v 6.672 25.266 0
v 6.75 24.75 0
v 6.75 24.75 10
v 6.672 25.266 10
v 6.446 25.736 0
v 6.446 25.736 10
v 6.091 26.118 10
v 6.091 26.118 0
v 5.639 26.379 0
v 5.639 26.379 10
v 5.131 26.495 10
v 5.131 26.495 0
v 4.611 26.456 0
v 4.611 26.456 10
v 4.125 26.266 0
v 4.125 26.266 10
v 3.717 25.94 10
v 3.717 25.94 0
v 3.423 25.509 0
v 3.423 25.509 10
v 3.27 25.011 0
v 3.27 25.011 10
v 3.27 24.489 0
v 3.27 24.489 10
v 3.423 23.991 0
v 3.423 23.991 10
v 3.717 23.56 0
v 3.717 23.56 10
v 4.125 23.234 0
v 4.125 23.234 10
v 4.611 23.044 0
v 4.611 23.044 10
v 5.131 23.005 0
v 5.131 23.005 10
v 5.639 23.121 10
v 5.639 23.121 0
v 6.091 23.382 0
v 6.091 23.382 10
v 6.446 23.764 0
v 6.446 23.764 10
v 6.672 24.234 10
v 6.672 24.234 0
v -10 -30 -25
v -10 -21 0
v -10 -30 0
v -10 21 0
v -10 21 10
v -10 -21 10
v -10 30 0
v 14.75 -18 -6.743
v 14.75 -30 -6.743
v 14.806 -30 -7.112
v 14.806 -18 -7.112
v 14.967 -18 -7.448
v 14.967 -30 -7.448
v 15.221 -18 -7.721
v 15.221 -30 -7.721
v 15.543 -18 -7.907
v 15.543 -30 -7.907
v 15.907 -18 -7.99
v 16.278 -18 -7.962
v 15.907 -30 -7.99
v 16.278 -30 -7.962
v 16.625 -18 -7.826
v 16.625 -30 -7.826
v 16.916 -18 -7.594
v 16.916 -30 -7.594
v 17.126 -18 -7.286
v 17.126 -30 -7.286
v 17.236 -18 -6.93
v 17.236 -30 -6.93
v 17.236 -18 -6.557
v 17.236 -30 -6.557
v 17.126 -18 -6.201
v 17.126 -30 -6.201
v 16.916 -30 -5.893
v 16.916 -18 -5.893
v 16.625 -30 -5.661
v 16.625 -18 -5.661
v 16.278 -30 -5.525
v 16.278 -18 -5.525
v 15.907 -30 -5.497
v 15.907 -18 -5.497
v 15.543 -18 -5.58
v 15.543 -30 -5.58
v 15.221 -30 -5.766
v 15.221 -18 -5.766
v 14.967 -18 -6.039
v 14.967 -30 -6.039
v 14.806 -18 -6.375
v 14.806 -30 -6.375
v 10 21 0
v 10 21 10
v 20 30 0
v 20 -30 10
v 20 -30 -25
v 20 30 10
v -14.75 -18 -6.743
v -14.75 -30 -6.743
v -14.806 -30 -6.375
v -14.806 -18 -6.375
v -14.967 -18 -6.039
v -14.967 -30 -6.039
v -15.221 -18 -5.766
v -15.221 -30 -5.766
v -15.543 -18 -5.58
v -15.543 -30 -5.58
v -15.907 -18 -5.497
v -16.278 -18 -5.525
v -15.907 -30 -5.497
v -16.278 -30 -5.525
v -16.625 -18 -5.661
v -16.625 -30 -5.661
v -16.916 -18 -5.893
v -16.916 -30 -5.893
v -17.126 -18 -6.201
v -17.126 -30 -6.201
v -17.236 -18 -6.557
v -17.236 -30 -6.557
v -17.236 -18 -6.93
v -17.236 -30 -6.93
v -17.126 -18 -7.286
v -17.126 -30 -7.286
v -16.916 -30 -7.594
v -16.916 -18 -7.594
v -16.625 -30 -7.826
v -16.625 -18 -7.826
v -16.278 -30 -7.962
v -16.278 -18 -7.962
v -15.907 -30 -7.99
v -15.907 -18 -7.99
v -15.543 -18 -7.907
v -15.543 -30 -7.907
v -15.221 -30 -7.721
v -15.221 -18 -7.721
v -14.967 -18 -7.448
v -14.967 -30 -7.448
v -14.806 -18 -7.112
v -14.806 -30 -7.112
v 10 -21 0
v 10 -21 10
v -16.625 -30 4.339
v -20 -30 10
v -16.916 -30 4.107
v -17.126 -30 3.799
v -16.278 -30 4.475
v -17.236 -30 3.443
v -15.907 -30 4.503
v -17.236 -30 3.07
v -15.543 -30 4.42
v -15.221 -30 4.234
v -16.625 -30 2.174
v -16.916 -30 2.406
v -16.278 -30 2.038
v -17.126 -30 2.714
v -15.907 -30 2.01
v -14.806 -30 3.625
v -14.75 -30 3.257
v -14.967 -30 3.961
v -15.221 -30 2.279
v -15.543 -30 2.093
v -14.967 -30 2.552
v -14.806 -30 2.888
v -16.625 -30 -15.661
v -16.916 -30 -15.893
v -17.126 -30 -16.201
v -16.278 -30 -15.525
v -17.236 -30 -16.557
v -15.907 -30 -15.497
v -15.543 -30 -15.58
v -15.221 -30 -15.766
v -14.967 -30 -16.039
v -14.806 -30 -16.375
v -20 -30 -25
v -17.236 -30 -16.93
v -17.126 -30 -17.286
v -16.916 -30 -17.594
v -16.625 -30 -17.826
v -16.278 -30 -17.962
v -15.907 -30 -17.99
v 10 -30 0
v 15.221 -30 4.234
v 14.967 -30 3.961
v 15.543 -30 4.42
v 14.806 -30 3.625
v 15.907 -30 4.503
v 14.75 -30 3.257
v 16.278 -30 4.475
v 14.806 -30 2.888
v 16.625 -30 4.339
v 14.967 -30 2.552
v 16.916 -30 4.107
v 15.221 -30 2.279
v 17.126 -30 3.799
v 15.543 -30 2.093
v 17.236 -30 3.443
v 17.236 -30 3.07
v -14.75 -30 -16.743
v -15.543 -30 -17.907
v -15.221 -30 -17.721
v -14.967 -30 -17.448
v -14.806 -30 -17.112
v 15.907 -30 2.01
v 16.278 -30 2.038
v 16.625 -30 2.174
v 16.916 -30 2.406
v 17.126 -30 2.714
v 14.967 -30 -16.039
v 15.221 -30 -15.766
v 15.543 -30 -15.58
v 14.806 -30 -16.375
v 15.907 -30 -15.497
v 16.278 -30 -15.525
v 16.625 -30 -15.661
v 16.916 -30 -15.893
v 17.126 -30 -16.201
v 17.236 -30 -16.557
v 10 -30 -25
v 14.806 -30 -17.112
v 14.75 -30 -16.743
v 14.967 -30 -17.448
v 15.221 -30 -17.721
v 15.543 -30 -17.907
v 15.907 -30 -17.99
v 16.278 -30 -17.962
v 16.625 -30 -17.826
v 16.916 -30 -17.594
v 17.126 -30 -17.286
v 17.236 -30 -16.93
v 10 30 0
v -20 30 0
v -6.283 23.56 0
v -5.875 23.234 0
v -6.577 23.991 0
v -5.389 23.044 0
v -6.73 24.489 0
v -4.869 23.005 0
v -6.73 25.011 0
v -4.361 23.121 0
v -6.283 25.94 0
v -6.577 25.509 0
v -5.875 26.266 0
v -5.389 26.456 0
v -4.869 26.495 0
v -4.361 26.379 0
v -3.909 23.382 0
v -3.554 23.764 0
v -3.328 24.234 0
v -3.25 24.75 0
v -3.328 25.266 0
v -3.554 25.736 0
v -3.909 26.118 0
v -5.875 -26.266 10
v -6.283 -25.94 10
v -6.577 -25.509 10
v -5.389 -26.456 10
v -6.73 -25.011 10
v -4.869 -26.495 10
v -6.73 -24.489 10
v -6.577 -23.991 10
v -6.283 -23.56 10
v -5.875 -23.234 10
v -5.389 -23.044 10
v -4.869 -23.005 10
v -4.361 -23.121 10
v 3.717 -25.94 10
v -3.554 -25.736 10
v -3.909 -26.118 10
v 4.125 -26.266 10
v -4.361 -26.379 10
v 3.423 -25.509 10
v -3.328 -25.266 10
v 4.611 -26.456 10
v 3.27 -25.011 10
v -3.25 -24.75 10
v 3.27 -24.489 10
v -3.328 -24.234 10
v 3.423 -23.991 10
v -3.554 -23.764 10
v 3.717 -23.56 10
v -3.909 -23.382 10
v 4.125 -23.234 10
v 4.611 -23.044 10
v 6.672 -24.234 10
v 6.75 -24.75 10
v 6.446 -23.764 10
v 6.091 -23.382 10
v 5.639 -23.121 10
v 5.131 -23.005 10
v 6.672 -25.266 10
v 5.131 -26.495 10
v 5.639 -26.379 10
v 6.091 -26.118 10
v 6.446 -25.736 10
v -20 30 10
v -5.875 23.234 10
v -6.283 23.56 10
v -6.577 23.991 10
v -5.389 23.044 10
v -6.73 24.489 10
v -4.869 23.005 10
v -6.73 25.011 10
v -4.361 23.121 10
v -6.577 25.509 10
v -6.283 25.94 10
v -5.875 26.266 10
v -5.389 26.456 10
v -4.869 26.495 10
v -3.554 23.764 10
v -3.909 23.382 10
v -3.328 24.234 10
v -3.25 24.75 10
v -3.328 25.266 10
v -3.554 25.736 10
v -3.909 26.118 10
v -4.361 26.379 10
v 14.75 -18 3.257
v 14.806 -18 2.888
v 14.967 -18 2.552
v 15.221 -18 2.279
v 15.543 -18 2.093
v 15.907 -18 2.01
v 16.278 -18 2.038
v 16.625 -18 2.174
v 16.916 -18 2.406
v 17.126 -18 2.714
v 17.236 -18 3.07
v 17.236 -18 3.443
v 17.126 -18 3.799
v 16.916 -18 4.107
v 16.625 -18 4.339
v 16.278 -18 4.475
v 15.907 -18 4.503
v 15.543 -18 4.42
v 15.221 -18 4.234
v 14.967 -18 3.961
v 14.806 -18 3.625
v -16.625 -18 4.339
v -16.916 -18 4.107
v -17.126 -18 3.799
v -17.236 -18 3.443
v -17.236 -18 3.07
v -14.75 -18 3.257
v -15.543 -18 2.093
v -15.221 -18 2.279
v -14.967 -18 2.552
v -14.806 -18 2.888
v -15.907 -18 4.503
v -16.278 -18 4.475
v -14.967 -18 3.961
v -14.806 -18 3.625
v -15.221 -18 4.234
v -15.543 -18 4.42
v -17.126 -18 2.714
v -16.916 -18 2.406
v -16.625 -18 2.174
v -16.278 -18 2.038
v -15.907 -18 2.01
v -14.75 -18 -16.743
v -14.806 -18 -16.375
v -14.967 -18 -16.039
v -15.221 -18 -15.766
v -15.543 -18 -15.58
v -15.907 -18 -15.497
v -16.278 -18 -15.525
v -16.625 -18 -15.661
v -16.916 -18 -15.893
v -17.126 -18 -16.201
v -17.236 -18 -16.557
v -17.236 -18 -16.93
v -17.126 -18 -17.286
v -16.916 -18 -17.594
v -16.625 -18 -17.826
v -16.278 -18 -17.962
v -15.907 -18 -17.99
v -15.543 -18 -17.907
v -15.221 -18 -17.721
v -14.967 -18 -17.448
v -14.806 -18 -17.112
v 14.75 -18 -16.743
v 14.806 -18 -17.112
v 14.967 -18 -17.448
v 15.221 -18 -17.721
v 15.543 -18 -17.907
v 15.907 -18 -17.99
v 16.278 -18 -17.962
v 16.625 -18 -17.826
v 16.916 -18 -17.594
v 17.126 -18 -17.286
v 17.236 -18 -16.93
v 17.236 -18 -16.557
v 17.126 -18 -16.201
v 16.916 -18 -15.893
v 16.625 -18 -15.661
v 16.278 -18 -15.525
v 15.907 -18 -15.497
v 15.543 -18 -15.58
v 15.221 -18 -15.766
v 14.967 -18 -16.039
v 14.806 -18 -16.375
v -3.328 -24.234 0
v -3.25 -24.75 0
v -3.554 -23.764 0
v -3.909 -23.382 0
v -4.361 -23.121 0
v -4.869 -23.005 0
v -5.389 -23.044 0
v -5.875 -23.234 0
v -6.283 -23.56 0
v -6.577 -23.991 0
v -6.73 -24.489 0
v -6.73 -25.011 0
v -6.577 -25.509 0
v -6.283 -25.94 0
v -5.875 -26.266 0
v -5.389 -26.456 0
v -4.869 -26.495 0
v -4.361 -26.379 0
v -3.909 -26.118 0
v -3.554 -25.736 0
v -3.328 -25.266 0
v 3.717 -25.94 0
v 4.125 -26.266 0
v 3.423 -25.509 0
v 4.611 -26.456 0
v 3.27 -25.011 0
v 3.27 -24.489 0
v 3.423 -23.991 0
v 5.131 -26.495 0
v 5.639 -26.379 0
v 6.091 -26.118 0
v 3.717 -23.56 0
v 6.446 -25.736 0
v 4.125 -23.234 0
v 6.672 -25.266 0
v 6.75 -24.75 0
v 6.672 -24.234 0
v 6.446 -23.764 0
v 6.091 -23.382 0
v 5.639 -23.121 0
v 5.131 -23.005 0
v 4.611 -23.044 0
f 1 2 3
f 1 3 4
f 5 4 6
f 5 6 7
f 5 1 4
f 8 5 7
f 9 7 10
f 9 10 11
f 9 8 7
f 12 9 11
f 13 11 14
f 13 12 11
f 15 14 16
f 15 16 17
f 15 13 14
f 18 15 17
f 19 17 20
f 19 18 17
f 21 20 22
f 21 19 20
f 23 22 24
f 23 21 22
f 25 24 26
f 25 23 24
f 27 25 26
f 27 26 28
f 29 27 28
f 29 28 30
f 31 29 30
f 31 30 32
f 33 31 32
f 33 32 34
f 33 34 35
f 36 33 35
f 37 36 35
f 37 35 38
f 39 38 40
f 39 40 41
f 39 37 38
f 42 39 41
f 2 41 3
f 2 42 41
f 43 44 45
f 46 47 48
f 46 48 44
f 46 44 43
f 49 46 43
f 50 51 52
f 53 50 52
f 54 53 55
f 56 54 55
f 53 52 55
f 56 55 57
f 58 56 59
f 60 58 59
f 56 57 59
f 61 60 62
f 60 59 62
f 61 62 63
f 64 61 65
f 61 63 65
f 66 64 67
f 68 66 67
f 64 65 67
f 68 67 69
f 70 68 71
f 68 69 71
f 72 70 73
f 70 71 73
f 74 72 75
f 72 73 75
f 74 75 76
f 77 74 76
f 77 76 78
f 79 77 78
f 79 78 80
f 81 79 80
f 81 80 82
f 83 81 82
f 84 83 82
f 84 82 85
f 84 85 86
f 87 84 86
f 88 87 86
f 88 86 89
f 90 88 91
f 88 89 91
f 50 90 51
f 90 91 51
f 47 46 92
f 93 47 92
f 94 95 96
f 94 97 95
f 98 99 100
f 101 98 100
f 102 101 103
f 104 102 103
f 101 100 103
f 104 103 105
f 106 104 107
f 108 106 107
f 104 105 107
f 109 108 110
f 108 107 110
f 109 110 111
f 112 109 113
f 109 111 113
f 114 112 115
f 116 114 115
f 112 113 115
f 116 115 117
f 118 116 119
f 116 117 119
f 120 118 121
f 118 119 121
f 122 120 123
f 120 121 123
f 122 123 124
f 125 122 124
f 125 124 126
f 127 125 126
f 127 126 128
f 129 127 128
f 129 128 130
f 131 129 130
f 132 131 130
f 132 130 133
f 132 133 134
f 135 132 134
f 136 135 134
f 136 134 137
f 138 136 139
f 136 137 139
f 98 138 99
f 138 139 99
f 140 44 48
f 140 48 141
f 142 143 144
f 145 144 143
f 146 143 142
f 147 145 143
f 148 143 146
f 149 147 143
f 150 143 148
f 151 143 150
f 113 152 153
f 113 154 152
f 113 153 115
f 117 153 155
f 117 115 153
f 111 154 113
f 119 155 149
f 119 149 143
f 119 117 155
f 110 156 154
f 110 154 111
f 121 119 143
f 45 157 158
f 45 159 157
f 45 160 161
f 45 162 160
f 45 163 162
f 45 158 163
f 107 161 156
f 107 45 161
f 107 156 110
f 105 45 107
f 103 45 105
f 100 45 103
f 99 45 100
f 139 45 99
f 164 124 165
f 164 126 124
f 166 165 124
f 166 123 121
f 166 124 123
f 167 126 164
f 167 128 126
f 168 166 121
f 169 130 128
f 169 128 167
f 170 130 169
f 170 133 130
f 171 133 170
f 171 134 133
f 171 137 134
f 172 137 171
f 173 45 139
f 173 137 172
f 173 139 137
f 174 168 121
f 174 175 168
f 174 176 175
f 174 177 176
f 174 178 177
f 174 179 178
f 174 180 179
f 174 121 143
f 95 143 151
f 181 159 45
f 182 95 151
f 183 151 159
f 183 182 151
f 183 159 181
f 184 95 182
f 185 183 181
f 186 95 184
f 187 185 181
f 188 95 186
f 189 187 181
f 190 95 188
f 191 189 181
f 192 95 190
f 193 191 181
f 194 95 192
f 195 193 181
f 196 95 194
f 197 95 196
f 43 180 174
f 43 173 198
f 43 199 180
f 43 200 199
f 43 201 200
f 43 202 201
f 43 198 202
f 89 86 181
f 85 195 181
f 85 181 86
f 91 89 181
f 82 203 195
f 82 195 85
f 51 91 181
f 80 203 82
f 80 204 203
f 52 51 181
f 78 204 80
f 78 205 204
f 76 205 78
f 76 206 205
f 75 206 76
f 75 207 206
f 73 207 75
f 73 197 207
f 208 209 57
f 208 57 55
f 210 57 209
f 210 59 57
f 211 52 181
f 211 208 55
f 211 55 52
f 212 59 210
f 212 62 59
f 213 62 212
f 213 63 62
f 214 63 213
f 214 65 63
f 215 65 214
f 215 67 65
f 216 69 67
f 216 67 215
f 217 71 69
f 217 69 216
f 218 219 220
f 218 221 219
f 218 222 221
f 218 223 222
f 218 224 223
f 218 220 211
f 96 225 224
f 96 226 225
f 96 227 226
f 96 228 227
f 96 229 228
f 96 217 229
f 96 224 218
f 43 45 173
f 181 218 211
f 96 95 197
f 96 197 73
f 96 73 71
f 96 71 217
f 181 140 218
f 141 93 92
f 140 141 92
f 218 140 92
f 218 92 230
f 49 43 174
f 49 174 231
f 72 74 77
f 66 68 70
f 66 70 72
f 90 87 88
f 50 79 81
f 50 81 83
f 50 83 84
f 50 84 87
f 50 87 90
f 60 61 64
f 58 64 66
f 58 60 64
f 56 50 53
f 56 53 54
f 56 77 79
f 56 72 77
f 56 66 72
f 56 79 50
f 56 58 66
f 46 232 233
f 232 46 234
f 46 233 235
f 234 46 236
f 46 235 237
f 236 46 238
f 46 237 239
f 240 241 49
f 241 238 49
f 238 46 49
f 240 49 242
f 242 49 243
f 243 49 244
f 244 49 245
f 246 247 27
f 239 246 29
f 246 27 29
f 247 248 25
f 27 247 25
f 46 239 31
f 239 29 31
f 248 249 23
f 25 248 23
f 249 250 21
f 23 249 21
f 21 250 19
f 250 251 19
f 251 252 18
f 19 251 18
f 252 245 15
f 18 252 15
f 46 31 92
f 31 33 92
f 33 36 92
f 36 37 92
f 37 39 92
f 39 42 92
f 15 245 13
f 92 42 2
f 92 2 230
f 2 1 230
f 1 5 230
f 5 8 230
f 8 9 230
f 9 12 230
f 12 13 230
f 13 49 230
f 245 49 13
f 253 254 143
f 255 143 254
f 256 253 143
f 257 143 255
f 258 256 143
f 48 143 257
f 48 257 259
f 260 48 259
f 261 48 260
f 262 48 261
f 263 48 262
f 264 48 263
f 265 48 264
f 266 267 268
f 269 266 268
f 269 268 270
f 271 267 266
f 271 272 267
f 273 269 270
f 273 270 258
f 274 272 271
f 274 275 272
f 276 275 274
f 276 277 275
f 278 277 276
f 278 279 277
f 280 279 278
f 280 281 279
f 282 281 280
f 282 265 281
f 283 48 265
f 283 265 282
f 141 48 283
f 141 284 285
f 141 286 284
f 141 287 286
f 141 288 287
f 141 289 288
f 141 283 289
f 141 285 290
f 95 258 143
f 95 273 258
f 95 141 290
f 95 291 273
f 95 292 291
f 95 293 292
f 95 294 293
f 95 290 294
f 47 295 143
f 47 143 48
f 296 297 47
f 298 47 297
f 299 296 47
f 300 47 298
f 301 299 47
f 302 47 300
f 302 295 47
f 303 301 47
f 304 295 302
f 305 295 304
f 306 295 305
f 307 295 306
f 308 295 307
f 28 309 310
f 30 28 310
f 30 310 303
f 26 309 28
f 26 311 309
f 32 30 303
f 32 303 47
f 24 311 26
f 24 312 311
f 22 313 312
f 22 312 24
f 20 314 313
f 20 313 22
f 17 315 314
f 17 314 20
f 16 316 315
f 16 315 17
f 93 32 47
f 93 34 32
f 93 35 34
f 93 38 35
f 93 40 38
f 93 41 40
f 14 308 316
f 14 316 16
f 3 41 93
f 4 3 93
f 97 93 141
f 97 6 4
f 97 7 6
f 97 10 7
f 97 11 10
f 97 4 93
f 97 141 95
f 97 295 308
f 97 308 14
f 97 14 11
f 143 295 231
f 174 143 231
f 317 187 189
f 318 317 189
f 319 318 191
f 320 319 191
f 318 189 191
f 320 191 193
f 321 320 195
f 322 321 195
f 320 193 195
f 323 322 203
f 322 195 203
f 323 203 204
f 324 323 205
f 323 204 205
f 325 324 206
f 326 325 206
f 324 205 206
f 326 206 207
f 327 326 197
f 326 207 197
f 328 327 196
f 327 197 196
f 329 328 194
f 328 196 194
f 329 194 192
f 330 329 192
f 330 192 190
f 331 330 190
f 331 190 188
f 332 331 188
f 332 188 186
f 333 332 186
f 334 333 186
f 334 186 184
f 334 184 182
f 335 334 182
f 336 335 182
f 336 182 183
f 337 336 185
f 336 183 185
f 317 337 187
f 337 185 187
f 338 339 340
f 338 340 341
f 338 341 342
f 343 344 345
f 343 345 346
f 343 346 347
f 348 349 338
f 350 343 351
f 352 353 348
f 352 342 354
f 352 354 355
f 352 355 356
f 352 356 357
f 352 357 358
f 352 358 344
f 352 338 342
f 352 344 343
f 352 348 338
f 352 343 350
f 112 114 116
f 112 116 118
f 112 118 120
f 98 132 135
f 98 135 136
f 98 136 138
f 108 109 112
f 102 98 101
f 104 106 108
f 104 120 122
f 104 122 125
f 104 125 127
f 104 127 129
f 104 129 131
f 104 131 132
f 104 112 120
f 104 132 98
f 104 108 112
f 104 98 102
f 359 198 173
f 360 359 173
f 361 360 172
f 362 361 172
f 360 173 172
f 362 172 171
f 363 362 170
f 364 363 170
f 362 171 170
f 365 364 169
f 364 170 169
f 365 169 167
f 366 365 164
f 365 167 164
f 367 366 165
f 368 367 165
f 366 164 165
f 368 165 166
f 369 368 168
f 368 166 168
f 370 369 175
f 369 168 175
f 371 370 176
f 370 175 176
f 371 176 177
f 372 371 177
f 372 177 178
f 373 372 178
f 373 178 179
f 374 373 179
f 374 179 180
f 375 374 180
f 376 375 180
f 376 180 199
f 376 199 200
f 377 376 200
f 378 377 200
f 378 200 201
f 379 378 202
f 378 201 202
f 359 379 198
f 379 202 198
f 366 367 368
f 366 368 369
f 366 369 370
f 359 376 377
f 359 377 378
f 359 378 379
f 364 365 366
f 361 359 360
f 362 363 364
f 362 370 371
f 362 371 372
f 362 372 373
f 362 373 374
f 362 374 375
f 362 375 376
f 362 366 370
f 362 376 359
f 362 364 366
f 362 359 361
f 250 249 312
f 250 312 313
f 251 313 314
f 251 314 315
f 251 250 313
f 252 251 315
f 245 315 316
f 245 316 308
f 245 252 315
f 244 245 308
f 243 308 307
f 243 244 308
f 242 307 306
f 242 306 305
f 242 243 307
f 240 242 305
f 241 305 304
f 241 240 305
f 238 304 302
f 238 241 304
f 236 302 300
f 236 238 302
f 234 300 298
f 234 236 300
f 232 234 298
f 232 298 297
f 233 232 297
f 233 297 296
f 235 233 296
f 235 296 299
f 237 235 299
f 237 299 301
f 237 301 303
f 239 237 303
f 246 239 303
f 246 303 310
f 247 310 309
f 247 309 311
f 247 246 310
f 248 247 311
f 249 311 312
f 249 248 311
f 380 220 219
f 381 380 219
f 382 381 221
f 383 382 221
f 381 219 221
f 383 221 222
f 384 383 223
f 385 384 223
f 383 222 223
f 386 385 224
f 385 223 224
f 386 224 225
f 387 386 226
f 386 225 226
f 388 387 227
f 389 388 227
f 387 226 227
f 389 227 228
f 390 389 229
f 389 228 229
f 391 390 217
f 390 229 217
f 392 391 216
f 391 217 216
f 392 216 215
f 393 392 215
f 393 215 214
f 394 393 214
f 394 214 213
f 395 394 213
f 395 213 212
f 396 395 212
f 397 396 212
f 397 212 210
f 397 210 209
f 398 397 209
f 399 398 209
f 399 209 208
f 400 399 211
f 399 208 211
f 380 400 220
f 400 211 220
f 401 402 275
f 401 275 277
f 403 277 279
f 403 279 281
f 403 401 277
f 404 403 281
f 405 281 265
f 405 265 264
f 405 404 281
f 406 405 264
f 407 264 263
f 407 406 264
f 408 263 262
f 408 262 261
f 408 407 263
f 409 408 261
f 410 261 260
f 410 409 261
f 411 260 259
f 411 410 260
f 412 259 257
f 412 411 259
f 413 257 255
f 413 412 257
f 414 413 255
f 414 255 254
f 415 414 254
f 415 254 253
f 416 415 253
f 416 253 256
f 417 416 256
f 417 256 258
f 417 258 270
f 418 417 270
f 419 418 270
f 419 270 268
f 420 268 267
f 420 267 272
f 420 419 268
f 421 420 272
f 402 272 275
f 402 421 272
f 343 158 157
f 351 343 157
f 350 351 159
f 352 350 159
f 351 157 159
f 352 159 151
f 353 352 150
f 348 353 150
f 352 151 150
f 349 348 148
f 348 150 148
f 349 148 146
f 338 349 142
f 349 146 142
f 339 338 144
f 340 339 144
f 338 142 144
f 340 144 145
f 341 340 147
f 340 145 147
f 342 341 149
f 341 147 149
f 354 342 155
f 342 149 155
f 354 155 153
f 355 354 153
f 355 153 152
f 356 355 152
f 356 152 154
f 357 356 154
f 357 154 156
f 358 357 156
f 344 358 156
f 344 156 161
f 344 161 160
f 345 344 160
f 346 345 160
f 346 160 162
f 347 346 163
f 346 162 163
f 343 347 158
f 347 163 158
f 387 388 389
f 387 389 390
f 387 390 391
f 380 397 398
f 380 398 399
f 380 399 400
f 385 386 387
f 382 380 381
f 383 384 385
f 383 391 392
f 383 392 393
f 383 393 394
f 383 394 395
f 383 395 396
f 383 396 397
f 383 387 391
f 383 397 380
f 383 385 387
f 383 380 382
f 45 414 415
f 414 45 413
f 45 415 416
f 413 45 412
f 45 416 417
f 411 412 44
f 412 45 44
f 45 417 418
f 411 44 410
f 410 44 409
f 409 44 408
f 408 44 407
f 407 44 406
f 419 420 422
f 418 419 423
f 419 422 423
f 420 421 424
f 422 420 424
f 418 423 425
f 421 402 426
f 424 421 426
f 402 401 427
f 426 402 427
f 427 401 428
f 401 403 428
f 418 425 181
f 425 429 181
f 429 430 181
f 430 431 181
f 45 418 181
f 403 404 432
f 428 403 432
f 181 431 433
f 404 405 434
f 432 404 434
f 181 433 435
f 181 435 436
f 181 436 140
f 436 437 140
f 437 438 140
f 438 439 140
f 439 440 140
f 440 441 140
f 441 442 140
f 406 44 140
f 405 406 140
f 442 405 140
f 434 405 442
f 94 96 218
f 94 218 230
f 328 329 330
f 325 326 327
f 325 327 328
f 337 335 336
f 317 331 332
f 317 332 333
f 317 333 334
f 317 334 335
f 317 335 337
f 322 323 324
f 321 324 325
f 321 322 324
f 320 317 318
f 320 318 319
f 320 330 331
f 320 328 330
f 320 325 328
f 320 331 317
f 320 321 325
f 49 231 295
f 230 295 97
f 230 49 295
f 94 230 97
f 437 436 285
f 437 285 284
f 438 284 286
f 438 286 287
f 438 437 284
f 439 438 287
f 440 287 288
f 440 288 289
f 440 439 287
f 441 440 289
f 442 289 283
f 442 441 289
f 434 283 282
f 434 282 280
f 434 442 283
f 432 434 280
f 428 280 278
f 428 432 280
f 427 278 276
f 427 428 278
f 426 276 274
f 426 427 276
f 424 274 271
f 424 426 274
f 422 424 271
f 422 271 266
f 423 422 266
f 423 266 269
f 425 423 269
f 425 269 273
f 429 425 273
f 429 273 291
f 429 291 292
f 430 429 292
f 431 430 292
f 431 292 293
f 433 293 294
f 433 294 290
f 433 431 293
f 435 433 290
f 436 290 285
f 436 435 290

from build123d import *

# Parameters (mm, degrees)
SKETCH2_W           = 40
SKETCH2_H           = 60
SKETCH2_R           = 1.75
SKETCH2_W_2         = 22
SKETCH2_H_2         = 42
BOSS_EXTRUDE1_DEPTH = 10
BOSS_EXTRUDE3_DEPTH = 10
LPATTERN2_COUNT     = 2
LPATTERN2_PITCH     = 30
SKETCH5_R           = 1.25
CUT_EXTRUDE1_DEPTH  = 12


with BuildPart() as part:
    # Sketch2 → Boss-Extrude1 (new body)
    with BuildSketch(Plane.XY):
        Rectangle(SKETCH2_W, SKETCH2_H)
        with Locations((-5, 24.75)):
            Circle(SKETCH2_R, mode=Mode.SUBTRACT)
        with Locations((5, 24.75)):
            Circle(SKETCH2_R, mode=Mode.SUBTRACT)
        with Locations((-5, -24.75)):
            Circle(SKETCH2_R, mode=Mode.SUBTRACT)
        with Locations((5, -24.75)):
            Circle(SKETCH2_R, mode=Mode.SUBTRACT)
        Rectangle(SKETCH2_W_2, SKETCH2_H_2, mode=Mode.SUBTRACT)
    extrude(amount=BOSS_EXTRUDE1_DEPTH)

    # Sketch4 → Boss-Extrude3 (add)
    with BuildSketch(Plane(origin=(20, 0, 0), x_dir=(0, 0, -1), z_dir=(1, 0, 0))):
        Polygon((0, -30), (25, -30), (0, 30), (-10, 30), (-10, -30), align=None)
    boss_extrude3 = extrude(amount=-BOSS_EXTRUDE3_DEPTH)

    # LPattern2: Boss-Extrude3 ×2
    with Locations(*[(-i * LPATTERN2_PITCH, 0, 0) for i in range(1, LPATTERN2_COUNT)]):
        add(boss_extrude3)

    # Sketch5 → Cut-Extrude1 (cut)
    with BuildSketch(Plane.XZ.offset(30)):
        with Locations((-16, -16.7433949)):
            Circle(SKETCH5_R)
        with Locations((-16, 3.2566051)):
            Circle(SKETCH5_R)
        with Locations((-16, -6.7433949)):
            Circle(SKETCH5_R)
        with Locations(Location((16, -16.7433949, 0), (0, 0, 180))):
            Circle(SKETCH5_R)
        with Locations(Location((16, -6.7433949, 0), (0, 0, 180))):
            Circle(SKETCH5_R)
        with Locations(Location((16, 3.2566051, 0), (0, 0, 180))):
            Circle(SKETCH5_R)
    extrude(amount=-CUT_EXTRUDE1_DEPTH, mode=Mode.SUBTRACT)


solid = part.part
